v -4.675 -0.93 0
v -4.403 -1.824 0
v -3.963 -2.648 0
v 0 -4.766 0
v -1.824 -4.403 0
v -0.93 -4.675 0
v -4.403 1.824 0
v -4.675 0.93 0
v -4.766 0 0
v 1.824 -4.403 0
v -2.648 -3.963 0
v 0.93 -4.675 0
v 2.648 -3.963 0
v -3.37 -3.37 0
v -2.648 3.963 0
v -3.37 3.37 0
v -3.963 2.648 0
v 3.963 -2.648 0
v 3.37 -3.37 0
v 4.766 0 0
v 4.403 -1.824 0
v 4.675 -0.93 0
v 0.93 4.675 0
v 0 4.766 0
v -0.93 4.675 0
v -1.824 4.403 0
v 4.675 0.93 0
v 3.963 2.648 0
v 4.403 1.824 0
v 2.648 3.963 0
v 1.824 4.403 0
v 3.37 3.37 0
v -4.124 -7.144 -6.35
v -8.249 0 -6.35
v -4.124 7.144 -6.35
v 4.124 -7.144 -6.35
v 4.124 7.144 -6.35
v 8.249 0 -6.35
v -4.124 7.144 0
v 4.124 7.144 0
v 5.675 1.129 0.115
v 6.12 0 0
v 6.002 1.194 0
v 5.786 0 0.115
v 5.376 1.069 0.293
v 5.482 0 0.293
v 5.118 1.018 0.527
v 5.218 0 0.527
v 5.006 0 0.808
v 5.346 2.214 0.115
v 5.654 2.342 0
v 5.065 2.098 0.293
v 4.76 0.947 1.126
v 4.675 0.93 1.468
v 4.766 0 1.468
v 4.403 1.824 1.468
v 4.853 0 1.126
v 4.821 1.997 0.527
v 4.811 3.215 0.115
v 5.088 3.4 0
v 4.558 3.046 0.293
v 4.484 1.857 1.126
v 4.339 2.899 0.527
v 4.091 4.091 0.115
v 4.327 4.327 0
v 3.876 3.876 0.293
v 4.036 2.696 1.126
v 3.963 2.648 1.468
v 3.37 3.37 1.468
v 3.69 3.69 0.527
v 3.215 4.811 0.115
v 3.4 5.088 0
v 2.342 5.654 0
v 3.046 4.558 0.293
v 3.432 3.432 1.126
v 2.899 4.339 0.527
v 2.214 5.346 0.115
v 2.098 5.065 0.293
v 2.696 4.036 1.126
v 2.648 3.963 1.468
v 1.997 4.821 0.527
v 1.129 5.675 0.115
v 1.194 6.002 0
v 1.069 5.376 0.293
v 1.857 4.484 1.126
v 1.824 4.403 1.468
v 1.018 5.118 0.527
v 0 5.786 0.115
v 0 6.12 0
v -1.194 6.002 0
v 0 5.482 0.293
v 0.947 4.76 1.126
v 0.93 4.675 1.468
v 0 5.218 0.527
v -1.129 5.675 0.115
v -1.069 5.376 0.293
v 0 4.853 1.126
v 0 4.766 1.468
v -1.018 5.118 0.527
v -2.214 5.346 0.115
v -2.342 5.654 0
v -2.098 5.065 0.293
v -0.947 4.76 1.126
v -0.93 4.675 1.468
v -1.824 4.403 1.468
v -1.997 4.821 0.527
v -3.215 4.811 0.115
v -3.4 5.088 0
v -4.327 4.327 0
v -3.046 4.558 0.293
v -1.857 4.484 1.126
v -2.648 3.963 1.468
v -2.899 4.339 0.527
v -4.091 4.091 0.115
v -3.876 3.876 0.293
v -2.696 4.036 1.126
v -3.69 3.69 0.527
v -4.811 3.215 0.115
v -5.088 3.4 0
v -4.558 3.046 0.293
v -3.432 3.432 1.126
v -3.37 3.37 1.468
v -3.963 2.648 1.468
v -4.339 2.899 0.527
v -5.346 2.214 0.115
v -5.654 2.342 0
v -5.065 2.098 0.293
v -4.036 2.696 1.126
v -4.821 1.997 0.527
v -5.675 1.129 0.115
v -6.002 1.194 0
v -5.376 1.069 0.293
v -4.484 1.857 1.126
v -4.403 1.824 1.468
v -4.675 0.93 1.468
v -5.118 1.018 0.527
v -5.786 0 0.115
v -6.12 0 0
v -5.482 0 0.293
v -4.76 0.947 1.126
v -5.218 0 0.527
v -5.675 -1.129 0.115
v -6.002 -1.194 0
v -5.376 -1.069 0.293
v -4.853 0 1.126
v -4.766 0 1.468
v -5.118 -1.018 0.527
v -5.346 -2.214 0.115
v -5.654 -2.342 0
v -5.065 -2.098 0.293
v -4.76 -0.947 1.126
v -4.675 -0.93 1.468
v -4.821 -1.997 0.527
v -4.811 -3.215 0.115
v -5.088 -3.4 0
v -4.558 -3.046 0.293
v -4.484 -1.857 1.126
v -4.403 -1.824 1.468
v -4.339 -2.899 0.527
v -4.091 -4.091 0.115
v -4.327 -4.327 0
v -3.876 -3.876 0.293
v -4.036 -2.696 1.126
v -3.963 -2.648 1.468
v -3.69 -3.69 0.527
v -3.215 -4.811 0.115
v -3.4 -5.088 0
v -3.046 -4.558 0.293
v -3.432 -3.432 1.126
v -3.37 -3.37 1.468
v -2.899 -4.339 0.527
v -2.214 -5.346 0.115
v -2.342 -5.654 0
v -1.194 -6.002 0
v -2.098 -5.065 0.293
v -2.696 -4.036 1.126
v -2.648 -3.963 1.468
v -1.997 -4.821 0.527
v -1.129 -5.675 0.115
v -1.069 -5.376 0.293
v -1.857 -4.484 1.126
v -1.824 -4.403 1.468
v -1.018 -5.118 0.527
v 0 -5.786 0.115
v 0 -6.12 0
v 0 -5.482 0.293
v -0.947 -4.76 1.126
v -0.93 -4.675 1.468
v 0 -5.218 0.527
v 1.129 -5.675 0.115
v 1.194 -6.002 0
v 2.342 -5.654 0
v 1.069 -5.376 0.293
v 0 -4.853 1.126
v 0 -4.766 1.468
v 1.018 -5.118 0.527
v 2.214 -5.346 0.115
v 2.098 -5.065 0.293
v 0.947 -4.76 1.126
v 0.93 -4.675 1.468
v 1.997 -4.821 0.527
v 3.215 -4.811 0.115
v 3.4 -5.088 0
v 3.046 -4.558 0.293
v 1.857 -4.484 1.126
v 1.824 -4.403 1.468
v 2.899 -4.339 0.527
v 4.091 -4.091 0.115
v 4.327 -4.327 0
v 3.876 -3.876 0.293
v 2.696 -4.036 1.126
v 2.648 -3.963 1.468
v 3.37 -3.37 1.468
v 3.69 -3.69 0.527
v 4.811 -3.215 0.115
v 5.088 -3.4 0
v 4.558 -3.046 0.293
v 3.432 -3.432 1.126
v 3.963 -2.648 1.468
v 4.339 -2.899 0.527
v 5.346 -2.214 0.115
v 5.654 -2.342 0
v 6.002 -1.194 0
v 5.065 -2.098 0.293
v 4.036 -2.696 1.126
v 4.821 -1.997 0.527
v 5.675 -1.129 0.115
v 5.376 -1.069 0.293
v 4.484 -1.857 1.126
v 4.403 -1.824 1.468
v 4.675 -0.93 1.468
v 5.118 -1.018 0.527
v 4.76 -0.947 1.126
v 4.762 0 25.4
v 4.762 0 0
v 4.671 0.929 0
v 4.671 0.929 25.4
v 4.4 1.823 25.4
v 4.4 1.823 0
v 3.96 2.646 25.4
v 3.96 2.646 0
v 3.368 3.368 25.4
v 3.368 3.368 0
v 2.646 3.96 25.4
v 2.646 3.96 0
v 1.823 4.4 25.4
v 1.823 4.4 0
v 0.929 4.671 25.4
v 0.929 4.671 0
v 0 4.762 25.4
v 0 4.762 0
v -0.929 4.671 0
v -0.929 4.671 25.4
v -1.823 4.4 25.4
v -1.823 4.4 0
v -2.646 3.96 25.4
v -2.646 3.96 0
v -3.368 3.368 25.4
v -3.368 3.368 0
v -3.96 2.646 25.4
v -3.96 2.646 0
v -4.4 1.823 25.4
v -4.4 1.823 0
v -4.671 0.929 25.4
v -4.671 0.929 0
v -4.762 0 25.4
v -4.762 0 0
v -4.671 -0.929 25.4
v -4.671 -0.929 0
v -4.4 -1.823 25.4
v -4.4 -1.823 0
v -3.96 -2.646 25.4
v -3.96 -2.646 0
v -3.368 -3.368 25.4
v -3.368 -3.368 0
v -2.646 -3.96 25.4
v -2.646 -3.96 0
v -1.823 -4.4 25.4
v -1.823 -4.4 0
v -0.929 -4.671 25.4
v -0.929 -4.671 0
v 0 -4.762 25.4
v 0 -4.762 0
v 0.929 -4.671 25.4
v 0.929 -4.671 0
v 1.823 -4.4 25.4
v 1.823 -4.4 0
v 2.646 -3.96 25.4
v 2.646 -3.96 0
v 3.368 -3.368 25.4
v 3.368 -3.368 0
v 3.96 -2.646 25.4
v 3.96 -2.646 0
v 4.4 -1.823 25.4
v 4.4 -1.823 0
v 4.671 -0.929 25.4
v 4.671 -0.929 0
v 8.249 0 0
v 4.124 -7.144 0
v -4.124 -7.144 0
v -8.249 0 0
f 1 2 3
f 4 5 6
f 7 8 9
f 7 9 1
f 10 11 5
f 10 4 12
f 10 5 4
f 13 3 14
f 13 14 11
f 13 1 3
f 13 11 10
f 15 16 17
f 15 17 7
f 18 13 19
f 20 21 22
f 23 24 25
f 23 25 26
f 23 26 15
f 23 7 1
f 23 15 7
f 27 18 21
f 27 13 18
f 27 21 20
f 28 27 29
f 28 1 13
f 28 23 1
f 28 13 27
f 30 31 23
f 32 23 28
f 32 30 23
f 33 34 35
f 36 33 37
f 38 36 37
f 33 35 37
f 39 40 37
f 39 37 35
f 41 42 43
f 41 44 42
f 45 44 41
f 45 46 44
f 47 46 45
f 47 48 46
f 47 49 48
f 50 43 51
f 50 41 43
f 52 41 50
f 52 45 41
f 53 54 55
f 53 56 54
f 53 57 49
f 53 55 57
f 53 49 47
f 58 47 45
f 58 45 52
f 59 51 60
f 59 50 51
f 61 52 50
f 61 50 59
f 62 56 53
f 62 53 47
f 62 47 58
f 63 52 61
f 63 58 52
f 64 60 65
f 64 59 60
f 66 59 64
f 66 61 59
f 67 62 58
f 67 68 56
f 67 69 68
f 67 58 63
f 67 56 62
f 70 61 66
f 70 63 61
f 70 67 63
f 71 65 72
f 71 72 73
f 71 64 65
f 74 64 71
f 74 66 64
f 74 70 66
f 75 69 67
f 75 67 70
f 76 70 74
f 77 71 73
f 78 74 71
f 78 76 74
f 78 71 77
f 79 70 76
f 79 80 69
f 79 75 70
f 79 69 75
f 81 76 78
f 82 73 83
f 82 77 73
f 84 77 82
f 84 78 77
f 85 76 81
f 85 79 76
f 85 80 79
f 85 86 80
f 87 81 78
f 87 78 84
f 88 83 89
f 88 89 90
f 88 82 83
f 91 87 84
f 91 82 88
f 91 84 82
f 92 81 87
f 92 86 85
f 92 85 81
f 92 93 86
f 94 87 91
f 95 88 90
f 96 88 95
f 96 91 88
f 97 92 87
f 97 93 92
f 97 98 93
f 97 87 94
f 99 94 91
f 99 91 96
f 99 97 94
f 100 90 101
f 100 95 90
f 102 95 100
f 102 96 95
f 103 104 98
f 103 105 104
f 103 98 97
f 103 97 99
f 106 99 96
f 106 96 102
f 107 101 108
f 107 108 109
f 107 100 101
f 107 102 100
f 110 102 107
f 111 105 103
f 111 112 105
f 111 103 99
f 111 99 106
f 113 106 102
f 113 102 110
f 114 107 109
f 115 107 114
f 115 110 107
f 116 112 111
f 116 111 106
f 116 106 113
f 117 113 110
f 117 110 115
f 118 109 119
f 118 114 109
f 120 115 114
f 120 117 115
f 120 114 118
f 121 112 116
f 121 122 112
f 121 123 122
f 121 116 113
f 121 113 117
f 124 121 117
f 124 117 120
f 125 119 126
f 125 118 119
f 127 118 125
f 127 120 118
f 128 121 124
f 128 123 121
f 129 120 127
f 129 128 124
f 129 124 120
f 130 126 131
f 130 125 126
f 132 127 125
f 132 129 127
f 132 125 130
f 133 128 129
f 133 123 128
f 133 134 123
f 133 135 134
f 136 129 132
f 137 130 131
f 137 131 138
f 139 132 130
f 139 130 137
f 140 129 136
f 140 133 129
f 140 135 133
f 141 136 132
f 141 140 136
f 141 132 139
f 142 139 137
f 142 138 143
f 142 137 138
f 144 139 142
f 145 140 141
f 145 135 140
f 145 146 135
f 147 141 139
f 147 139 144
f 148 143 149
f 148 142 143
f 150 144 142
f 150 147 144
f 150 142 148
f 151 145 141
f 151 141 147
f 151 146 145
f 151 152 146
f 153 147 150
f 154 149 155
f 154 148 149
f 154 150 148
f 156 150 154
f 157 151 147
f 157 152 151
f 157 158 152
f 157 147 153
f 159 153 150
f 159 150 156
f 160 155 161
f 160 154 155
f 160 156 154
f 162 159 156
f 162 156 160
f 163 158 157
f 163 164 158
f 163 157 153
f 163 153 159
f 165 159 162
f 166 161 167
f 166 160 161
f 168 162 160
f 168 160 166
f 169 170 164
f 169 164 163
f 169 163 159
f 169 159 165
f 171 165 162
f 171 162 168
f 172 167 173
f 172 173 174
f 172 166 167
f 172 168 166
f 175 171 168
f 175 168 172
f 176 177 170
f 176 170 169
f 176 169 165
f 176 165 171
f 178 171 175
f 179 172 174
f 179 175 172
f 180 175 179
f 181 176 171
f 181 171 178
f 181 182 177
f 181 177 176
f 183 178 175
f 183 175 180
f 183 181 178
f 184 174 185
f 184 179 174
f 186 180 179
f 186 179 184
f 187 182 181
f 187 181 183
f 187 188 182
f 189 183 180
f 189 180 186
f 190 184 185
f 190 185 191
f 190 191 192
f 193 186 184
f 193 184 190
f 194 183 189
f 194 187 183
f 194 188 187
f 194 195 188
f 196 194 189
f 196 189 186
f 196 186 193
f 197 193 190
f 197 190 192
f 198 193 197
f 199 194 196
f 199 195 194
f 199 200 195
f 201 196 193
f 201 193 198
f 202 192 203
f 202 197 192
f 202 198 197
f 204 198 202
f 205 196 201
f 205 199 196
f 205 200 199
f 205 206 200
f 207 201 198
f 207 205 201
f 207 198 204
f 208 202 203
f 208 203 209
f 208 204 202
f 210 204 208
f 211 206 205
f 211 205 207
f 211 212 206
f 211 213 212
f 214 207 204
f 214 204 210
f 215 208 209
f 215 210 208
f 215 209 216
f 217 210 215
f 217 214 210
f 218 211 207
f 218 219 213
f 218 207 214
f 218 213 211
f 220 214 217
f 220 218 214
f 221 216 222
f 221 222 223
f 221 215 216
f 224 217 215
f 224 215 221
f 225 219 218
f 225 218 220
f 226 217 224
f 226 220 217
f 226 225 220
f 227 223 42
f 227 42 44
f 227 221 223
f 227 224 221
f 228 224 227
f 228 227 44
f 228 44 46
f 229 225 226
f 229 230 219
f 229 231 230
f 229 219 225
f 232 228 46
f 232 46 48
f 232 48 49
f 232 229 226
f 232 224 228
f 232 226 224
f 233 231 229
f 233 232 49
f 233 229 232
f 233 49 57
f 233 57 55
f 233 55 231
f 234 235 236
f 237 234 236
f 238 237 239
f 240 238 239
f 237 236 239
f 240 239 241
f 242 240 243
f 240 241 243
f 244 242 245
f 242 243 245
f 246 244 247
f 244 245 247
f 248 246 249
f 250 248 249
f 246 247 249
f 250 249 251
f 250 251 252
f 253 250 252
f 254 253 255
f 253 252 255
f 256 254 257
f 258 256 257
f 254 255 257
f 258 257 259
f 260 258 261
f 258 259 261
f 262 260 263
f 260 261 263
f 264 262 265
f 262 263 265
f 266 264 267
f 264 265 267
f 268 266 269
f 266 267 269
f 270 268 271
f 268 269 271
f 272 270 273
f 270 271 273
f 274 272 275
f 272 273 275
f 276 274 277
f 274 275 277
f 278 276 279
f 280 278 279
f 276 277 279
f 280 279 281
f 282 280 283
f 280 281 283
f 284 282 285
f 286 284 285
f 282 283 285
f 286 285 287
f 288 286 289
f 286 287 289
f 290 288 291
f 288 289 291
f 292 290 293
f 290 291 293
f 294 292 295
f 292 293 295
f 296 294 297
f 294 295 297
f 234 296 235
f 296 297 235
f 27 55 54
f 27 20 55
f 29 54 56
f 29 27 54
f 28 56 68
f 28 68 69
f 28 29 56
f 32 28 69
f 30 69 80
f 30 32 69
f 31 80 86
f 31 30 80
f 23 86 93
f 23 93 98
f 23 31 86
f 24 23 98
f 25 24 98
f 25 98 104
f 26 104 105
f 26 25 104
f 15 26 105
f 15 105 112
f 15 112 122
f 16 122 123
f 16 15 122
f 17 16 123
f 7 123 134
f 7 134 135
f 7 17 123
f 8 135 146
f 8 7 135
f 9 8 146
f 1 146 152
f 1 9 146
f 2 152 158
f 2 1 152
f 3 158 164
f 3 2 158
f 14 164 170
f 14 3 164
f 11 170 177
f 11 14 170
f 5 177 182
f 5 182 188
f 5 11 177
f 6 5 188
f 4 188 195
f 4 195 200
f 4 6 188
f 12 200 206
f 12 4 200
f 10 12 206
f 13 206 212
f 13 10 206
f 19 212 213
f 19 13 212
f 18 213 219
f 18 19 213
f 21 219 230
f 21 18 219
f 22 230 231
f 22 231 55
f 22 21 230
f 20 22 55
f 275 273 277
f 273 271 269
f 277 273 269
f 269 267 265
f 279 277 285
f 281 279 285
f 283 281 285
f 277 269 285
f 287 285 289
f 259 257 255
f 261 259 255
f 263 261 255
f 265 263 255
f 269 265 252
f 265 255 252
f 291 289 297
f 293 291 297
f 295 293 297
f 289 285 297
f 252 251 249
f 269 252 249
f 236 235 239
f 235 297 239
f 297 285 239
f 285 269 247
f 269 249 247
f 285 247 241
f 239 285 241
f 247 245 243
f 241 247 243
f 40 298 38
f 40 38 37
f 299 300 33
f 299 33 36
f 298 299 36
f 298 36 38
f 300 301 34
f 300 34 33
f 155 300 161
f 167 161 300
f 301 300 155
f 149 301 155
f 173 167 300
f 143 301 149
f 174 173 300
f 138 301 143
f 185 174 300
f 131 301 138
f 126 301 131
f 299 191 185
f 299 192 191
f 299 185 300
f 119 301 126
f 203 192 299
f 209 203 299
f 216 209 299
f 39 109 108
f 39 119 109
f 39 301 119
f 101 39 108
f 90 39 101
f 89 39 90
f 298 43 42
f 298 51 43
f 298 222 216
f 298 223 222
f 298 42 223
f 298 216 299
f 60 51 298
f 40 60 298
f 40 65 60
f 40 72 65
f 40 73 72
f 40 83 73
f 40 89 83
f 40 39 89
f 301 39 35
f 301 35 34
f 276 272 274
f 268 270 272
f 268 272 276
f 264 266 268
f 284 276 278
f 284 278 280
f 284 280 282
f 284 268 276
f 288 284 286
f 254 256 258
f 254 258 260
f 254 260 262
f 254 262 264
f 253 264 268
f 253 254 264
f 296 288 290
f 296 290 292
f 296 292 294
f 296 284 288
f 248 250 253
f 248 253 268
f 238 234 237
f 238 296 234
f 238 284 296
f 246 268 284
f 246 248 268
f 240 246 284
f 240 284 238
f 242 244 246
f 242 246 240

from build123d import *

# Parameters (mm, degrees)
F1_DEPTH = 6.35
F2_R     = 4.7625
F3_DEPTH = 25.4


with BuildPart() as f1:
    # F0 (on Top) → F1 (new body)
    with BuildSketch(Plane.XY):
        Polygon((4.124446, 7.14375), (-4.124446, 7.14375), (-8.248892, 0), (-4.124446, -7.14375), (4.124446, -7.14375), (8.248892, 0), align=None)
    extrude(amount=-F1_DEPTH)

    # F4 (on Front) → F5 (revolve)
    with BuildSketch(Plane.XZ):
        with BuildLine():
            ThreePointArc((6.119548, 0), (5.218409, 0.526892), (4.766191, 1.467725))
            Line((4.766191, 1.467725), (4.766191, 0))
            Line((4.766191, 0), (6.119548, 0))
        make_face()
    revolve(axis=Axis((0, 0, 1.933048), (0, 0, 1)))


with BuildPart() as f3:
    # F2 (on face) → F3 (new body)
    with BuildSketch(Plane.XY):
        Circle(F2_R)
    extrude(amount=F3_DEPTH)


solid = Compound([f1.part, f3.part])
